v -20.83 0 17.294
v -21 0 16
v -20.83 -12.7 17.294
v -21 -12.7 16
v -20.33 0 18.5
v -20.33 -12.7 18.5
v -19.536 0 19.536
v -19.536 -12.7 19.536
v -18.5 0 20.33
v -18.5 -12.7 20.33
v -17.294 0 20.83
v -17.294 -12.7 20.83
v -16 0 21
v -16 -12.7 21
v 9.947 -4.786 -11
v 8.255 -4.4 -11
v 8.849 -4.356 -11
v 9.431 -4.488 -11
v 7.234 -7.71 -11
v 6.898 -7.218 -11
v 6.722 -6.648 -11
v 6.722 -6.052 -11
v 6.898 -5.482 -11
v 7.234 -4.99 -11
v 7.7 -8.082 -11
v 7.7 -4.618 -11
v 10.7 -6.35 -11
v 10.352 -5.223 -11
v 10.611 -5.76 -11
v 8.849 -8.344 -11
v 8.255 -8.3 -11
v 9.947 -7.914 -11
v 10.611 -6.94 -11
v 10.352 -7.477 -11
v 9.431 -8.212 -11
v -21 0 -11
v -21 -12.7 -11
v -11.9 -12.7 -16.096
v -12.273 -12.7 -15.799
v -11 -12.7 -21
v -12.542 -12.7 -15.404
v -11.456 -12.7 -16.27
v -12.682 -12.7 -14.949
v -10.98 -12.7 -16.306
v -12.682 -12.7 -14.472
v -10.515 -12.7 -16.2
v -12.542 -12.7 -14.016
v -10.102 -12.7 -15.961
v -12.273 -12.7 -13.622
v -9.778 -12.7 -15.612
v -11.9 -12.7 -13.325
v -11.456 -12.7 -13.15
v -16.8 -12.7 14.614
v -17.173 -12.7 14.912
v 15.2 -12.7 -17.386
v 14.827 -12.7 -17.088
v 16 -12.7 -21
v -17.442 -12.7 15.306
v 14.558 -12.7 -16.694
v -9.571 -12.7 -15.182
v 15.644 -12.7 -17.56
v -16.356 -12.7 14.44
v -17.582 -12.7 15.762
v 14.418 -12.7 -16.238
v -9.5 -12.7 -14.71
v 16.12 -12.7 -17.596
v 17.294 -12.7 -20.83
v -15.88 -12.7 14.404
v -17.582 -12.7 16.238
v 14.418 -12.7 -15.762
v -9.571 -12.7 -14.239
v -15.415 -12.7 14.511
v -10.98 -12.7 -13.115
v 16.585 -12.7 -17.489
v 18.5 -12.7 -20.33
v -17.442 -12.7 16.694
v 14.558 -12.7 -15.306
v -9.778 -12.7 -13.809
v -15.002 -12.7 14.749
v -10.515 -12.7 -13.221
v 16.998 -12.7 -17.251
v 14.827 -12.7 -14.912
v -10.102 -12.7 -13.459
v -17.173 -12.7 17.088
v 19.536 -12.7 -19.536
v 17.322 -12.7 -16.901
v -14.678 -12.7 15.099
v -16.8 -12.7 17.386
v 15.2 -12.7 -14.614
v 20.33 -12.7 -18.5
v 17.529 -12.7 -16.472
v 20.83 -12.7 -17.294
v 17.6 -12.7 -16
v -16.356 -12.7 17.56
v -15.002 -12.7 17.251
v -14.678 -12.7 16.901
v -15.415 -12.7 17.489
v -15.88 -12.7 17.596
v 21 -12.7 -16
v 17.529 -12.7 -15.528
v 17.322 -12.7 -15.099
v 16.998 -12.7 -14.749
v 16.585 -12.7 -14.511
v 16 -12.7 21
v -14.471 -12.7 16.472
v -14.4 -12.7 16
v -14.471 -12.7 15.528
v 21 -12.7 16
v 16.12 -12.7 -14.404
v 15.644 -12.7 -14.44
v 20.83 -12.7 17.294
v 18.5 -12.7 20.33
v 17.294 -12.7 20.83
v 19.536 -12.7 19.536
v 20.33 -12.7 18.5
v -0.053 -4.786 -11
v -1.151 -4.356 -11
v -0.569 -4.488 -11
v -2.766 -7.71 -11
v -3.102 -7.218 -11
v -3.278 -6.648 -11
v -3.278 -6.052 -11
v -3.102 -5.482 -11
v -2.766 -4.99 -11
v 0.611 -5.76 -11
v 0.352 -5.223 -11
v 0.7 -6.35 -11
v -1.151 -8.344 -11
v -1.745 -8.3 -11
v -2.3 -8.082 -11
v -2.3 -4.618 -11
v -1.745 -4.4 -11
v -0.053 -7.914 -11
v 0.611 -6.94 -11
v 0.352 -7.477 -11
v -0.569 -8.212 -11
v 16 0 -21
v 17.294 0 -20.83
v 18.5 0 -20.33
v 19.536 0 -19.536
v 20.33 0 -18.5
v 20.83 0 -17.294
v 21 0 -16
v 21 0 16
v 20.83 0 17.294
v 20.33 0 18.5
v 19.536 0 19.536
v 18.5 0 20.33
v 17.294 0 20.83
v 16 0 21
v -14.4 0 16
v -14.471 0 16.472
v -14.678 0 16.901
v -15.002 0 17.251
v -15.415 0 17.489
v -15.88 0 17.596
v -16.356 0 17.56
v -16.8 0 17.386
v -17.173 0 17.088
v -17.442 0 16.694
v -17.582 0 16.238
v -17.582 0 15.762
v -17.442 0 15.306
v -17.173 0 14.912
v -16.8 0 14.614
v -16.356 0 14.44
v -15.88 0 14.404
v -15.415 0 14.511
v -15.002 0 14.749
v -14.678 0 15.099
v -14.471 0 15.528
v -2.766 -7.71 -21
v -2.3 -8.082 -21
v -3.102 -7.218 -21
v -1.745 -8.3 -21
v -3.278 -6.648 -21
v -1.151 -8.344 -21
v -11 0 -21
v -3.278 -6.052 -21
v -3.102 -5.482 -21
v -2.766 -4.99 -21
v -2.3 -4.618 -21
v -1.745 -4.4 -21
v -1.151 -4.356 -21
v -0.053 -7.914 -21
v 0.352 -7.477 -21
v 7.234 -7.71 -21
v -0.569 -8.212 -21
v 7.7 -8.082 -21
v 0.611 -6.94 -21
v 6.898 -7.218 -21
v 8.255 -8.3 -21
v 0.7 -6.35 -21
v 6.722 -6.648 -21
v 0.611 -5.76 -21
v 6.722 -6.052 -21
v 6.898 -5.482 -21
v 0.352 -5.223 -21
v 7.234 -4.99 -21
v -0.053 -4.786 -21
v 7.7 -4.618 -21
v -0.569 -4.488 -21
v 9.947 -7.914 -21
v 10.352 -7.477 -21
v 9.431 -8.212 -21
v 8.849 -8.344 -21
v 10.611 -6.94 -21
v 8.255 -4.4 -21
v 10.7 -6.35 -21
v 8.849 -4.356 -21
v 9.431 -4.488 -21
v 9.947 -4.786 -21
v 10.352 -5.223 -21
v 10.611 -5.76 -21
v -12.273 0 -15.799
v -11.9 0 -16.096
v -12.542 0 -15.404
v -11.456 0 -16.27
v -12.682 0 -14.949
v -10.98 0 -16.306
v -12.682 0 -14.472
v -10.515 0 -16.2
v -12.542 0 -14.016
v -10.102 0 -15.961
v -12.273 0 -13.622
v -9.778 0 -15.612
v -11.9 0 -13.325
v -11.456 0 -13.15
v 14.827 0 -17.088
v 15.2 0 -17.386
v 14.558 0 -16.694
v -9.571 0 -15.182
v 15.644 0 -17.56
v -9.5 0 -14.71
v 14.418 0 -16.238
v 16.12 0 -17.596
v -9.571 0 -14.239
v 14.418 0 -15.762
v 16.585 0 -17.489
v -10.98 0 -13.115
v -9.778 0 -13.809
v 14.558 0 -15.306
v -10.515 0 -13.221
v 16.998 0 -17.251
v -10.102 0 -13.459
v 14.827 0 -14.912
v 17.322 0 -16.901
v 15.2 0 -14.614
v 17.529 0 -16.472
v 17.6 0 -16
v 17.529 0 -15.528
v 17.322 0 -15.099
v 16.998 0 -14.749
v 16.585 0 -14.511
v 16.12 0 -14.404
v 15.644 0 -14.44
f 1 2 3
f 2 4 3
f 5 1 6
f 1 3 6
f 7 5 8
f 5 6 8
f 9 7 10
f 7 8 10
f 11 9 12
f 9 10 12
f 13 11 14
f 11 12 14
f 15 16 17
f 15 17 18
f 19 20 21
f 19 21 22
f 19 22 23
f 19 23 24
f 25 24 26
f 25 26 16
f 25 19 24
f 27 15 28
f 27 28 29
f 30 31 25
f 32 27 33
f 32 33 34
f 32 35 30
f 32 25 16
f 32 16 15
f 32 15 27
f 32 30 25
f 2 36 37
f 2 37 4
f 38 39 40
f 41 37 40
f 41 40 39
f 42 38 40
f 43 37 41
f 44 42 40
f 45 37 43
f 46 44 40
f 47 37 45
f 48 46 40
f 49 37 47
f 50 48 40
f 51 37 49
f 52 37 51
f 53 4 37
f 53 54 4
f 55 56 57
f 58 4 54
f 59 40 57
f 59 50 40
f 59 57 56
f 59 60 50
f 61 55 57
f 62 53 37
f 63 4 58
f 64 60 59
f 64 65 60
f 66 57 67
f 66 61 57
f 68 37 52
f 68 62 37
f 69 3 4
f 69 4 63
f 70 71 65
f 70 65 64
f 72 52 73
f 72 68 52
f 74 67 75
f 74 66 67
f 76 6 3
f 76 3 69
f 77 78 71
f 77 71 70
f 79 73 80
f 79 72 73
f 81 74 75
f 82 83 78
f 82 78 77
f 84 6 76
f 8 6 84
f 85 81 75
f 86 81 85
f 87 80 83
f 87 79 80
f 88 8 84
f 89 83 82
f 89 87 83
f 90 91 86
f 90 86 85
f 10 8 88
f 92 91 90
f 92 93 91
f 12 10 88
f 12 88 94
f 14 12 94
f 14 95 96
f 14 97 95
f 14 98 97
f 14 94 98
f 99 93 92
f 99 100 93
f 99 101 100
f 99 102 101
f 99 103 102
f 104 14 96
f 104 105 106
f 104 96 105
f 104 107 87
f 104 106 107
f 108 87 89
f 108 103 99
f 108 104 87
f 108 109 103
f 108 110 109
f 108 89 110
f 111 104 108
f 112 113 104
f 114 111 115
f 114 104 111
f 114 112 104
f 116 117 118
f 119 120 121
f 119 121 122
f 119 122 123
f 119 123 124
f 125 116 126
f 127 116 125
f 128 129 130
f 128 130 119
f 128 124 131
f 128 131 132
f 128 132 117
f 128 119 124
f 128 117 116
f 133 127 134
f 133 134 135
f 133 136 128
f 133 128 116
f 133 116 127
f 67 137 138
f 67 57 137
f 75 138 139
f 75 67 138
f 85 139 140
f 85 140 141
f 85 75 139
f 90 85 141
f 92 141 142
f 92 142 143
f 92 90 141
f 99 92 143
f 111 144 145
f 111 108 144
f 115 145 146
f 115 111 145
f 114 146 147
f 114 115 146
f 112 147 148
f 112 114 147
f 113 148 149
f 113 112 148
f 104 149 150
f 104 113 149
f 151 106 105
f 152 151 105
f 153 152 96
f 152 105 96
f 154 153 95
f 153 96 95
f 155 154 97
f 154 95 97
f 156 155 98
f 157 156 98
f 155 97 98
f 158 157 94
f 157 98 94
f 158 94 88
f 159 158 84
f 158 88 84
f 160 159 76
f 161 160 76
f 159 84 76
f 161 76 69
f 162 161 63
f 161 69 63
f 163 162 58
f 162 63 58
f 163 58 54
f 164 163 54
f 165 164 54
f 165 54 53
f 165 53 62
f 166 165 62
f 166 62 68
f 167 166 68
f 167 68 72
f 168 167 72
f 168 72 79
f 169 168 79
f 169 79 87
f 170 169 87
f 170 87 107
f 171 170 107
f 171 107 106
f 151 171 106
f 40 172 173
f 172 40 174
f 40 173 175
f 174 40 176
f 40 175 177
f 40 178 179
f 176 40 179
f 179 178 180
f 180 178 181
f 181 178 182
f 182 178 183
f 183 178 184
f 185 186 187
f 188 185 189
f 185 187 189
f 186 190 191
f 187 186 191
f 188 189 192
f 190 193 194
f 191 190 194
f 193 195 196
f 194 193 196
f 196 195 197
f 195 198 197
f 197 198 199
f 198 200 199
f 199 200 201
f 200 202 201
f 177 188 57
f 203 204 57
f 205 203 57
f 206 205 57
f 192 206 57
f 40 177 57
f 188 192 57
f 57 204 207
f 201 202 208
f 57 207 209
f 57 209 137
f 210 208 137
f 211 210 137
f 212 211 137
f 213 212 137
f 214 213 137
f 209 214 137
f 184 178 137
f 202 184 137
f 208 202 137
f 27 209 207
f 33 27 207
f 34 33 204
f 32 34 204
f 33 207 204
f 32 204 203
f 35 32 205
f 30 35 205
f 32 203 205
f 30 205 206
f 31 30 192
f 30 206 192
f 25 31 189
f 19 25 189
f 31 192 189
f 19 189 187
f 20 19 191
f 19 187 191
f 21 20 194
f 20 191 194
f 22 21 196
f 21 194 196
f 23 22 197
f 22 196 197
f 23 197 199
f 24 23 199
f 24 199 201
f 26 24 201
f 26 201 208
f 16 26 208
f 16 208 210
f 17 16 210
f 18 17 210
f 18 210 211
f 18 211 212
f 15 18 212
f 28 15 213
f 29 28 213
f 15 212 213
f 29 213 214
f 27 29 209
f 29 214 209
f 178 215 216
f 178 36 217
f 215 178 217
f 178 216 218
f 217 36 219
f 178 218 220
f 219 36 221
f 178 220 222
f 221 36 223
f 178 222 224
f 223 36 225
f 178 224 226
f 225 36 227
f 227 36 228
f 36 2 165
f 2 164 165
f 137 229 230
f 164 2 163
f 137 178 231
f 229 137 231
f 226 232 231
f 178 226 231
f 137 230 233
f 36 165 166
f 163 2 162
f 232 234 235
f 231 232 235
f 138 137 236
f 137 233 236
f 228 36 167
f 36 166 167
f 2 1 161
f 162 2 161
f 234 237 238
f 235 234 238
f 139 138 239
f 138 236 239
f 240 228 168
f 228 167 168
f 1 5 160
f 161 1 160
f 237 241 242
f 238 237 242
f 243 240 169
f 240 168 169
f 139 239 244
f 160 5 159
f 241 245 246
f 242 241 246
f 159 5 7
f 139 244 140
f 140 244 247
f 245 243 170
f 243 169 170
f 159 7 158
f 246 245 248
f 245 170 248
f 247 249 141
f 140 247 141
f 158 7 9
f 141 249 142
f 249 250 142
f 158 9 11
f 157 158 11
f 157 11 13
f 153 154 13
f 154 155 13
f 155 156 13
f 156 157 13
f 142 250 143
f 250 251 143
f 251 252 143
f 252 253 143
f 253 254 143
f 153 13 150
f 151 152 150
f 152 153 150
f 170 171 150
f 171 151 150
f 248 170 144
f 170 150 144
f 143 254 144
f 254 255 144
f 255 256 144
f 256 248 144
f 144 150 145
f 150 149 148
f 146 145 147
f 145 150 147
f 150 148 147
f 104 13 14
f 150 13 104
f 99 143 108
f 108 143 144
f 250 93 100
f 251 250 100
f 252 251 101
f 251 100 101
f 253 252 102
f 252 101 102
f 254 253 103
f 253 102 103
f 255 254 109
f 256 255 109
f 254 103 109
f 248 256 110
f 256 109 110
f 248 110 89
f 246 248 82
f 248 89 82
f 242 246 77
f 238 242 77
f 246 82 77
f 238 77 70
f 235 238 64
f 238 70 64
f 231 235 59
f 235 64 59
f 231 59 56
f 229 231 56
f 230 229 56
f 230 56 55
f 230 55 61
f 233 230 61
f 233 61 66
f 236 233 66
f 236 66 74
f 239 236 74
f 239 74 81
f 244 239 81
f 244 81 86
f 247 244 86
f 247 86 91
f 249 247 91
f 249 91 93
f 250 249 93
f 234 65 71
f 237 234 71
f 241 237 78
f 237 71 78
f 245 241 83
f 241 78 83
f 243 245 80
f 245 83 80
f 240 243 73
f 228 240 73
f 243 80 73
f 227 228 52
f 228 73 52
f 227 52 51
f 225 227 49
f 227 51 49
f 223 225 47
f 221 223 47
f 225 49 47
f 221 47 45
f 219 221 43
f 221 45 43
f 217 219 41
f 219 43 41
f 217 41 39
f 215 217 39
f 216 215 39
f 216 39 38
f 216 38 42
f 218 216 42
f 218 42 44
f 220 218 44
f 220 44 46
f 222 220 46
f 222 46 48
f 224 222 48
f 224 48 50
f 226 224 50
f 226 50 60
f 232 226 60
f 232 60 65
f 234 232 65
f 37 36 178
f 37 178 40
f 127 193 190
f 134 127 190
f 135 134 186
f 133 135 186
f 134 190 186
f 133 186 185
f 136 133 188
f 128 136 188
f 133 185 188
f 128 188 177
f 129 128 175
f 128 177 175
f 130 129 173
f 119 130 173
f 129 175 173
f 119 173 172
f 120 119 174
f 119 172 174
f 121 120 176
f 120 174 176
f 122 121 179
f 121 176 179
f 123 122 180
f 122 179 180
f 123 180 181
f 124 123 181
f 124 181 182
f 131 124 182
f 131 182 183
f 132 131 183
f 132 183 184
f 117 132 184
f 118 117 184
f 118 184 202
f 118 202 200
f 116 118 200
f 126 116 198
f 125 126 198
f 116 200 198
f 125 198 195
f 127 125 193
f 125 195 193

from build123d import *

# Parameters (mm, degrees)
F0_W     = 42
F0_H     = 42
F1_DEPTH = 12.7
F2_R     = 5
F3_SIZE  = 10
F4_R     = 1.6
F5_DEPTH = 25
F6_R     = 2
F7_DEPTH = 10


with BuildPart() as f1:
    # F0 (on Front) → F1 (new body)
    with BuildSketch(Plane.XZ):
        Rectangle(F0_W, F0_H)
    extrude(amount=F1_DEPTH)

    # F2
    f2_edges = [f1.edges().sort_by_distance(p)[0] for p in [
        (21, -6.35, 21),
        (-21, -6.35, 21),
        (21, -6.35, -21),
    ]]
    fillet(f2_edges, radius=F2_R)

    # F3
    f3_edges = [f1.edges().sort_by_distance(p)[0] for p in [
        (-21, -6.35, -21),
    ]]
    chamfer(f3_edges, length=F3_SIZE)

    # F4 (on face) → F5 (cut)
    with BuildSketch(Plane.XZ.offset(12.7)):
        with Locations((-16, 16)):
            Circle(F4_R)
        with Locations((16, -16)):
            Circle(F4_R)
        with Locations((-11.1, -14.710243)):
            Circle(F4_R)
    extrude(amount=-F5_DEPTH, mode=Mode.SUBTRACT)

    # F6 (on face) → F7 (cut)
    with BuildSketch(Plane(origin=(0, 0, -21), x_dir=(1, 0, 0), z_dir=(0, 0, -1))):
        with Locations((8.7, 6.35)):
            Circle(F6_R)
        with Locations((-1.3, 6.35)):
            Circle(F6_R)
    extrude(amount=-F7_DEPTH, mode=Mode.SUBTRACT)


solid = f1.part
